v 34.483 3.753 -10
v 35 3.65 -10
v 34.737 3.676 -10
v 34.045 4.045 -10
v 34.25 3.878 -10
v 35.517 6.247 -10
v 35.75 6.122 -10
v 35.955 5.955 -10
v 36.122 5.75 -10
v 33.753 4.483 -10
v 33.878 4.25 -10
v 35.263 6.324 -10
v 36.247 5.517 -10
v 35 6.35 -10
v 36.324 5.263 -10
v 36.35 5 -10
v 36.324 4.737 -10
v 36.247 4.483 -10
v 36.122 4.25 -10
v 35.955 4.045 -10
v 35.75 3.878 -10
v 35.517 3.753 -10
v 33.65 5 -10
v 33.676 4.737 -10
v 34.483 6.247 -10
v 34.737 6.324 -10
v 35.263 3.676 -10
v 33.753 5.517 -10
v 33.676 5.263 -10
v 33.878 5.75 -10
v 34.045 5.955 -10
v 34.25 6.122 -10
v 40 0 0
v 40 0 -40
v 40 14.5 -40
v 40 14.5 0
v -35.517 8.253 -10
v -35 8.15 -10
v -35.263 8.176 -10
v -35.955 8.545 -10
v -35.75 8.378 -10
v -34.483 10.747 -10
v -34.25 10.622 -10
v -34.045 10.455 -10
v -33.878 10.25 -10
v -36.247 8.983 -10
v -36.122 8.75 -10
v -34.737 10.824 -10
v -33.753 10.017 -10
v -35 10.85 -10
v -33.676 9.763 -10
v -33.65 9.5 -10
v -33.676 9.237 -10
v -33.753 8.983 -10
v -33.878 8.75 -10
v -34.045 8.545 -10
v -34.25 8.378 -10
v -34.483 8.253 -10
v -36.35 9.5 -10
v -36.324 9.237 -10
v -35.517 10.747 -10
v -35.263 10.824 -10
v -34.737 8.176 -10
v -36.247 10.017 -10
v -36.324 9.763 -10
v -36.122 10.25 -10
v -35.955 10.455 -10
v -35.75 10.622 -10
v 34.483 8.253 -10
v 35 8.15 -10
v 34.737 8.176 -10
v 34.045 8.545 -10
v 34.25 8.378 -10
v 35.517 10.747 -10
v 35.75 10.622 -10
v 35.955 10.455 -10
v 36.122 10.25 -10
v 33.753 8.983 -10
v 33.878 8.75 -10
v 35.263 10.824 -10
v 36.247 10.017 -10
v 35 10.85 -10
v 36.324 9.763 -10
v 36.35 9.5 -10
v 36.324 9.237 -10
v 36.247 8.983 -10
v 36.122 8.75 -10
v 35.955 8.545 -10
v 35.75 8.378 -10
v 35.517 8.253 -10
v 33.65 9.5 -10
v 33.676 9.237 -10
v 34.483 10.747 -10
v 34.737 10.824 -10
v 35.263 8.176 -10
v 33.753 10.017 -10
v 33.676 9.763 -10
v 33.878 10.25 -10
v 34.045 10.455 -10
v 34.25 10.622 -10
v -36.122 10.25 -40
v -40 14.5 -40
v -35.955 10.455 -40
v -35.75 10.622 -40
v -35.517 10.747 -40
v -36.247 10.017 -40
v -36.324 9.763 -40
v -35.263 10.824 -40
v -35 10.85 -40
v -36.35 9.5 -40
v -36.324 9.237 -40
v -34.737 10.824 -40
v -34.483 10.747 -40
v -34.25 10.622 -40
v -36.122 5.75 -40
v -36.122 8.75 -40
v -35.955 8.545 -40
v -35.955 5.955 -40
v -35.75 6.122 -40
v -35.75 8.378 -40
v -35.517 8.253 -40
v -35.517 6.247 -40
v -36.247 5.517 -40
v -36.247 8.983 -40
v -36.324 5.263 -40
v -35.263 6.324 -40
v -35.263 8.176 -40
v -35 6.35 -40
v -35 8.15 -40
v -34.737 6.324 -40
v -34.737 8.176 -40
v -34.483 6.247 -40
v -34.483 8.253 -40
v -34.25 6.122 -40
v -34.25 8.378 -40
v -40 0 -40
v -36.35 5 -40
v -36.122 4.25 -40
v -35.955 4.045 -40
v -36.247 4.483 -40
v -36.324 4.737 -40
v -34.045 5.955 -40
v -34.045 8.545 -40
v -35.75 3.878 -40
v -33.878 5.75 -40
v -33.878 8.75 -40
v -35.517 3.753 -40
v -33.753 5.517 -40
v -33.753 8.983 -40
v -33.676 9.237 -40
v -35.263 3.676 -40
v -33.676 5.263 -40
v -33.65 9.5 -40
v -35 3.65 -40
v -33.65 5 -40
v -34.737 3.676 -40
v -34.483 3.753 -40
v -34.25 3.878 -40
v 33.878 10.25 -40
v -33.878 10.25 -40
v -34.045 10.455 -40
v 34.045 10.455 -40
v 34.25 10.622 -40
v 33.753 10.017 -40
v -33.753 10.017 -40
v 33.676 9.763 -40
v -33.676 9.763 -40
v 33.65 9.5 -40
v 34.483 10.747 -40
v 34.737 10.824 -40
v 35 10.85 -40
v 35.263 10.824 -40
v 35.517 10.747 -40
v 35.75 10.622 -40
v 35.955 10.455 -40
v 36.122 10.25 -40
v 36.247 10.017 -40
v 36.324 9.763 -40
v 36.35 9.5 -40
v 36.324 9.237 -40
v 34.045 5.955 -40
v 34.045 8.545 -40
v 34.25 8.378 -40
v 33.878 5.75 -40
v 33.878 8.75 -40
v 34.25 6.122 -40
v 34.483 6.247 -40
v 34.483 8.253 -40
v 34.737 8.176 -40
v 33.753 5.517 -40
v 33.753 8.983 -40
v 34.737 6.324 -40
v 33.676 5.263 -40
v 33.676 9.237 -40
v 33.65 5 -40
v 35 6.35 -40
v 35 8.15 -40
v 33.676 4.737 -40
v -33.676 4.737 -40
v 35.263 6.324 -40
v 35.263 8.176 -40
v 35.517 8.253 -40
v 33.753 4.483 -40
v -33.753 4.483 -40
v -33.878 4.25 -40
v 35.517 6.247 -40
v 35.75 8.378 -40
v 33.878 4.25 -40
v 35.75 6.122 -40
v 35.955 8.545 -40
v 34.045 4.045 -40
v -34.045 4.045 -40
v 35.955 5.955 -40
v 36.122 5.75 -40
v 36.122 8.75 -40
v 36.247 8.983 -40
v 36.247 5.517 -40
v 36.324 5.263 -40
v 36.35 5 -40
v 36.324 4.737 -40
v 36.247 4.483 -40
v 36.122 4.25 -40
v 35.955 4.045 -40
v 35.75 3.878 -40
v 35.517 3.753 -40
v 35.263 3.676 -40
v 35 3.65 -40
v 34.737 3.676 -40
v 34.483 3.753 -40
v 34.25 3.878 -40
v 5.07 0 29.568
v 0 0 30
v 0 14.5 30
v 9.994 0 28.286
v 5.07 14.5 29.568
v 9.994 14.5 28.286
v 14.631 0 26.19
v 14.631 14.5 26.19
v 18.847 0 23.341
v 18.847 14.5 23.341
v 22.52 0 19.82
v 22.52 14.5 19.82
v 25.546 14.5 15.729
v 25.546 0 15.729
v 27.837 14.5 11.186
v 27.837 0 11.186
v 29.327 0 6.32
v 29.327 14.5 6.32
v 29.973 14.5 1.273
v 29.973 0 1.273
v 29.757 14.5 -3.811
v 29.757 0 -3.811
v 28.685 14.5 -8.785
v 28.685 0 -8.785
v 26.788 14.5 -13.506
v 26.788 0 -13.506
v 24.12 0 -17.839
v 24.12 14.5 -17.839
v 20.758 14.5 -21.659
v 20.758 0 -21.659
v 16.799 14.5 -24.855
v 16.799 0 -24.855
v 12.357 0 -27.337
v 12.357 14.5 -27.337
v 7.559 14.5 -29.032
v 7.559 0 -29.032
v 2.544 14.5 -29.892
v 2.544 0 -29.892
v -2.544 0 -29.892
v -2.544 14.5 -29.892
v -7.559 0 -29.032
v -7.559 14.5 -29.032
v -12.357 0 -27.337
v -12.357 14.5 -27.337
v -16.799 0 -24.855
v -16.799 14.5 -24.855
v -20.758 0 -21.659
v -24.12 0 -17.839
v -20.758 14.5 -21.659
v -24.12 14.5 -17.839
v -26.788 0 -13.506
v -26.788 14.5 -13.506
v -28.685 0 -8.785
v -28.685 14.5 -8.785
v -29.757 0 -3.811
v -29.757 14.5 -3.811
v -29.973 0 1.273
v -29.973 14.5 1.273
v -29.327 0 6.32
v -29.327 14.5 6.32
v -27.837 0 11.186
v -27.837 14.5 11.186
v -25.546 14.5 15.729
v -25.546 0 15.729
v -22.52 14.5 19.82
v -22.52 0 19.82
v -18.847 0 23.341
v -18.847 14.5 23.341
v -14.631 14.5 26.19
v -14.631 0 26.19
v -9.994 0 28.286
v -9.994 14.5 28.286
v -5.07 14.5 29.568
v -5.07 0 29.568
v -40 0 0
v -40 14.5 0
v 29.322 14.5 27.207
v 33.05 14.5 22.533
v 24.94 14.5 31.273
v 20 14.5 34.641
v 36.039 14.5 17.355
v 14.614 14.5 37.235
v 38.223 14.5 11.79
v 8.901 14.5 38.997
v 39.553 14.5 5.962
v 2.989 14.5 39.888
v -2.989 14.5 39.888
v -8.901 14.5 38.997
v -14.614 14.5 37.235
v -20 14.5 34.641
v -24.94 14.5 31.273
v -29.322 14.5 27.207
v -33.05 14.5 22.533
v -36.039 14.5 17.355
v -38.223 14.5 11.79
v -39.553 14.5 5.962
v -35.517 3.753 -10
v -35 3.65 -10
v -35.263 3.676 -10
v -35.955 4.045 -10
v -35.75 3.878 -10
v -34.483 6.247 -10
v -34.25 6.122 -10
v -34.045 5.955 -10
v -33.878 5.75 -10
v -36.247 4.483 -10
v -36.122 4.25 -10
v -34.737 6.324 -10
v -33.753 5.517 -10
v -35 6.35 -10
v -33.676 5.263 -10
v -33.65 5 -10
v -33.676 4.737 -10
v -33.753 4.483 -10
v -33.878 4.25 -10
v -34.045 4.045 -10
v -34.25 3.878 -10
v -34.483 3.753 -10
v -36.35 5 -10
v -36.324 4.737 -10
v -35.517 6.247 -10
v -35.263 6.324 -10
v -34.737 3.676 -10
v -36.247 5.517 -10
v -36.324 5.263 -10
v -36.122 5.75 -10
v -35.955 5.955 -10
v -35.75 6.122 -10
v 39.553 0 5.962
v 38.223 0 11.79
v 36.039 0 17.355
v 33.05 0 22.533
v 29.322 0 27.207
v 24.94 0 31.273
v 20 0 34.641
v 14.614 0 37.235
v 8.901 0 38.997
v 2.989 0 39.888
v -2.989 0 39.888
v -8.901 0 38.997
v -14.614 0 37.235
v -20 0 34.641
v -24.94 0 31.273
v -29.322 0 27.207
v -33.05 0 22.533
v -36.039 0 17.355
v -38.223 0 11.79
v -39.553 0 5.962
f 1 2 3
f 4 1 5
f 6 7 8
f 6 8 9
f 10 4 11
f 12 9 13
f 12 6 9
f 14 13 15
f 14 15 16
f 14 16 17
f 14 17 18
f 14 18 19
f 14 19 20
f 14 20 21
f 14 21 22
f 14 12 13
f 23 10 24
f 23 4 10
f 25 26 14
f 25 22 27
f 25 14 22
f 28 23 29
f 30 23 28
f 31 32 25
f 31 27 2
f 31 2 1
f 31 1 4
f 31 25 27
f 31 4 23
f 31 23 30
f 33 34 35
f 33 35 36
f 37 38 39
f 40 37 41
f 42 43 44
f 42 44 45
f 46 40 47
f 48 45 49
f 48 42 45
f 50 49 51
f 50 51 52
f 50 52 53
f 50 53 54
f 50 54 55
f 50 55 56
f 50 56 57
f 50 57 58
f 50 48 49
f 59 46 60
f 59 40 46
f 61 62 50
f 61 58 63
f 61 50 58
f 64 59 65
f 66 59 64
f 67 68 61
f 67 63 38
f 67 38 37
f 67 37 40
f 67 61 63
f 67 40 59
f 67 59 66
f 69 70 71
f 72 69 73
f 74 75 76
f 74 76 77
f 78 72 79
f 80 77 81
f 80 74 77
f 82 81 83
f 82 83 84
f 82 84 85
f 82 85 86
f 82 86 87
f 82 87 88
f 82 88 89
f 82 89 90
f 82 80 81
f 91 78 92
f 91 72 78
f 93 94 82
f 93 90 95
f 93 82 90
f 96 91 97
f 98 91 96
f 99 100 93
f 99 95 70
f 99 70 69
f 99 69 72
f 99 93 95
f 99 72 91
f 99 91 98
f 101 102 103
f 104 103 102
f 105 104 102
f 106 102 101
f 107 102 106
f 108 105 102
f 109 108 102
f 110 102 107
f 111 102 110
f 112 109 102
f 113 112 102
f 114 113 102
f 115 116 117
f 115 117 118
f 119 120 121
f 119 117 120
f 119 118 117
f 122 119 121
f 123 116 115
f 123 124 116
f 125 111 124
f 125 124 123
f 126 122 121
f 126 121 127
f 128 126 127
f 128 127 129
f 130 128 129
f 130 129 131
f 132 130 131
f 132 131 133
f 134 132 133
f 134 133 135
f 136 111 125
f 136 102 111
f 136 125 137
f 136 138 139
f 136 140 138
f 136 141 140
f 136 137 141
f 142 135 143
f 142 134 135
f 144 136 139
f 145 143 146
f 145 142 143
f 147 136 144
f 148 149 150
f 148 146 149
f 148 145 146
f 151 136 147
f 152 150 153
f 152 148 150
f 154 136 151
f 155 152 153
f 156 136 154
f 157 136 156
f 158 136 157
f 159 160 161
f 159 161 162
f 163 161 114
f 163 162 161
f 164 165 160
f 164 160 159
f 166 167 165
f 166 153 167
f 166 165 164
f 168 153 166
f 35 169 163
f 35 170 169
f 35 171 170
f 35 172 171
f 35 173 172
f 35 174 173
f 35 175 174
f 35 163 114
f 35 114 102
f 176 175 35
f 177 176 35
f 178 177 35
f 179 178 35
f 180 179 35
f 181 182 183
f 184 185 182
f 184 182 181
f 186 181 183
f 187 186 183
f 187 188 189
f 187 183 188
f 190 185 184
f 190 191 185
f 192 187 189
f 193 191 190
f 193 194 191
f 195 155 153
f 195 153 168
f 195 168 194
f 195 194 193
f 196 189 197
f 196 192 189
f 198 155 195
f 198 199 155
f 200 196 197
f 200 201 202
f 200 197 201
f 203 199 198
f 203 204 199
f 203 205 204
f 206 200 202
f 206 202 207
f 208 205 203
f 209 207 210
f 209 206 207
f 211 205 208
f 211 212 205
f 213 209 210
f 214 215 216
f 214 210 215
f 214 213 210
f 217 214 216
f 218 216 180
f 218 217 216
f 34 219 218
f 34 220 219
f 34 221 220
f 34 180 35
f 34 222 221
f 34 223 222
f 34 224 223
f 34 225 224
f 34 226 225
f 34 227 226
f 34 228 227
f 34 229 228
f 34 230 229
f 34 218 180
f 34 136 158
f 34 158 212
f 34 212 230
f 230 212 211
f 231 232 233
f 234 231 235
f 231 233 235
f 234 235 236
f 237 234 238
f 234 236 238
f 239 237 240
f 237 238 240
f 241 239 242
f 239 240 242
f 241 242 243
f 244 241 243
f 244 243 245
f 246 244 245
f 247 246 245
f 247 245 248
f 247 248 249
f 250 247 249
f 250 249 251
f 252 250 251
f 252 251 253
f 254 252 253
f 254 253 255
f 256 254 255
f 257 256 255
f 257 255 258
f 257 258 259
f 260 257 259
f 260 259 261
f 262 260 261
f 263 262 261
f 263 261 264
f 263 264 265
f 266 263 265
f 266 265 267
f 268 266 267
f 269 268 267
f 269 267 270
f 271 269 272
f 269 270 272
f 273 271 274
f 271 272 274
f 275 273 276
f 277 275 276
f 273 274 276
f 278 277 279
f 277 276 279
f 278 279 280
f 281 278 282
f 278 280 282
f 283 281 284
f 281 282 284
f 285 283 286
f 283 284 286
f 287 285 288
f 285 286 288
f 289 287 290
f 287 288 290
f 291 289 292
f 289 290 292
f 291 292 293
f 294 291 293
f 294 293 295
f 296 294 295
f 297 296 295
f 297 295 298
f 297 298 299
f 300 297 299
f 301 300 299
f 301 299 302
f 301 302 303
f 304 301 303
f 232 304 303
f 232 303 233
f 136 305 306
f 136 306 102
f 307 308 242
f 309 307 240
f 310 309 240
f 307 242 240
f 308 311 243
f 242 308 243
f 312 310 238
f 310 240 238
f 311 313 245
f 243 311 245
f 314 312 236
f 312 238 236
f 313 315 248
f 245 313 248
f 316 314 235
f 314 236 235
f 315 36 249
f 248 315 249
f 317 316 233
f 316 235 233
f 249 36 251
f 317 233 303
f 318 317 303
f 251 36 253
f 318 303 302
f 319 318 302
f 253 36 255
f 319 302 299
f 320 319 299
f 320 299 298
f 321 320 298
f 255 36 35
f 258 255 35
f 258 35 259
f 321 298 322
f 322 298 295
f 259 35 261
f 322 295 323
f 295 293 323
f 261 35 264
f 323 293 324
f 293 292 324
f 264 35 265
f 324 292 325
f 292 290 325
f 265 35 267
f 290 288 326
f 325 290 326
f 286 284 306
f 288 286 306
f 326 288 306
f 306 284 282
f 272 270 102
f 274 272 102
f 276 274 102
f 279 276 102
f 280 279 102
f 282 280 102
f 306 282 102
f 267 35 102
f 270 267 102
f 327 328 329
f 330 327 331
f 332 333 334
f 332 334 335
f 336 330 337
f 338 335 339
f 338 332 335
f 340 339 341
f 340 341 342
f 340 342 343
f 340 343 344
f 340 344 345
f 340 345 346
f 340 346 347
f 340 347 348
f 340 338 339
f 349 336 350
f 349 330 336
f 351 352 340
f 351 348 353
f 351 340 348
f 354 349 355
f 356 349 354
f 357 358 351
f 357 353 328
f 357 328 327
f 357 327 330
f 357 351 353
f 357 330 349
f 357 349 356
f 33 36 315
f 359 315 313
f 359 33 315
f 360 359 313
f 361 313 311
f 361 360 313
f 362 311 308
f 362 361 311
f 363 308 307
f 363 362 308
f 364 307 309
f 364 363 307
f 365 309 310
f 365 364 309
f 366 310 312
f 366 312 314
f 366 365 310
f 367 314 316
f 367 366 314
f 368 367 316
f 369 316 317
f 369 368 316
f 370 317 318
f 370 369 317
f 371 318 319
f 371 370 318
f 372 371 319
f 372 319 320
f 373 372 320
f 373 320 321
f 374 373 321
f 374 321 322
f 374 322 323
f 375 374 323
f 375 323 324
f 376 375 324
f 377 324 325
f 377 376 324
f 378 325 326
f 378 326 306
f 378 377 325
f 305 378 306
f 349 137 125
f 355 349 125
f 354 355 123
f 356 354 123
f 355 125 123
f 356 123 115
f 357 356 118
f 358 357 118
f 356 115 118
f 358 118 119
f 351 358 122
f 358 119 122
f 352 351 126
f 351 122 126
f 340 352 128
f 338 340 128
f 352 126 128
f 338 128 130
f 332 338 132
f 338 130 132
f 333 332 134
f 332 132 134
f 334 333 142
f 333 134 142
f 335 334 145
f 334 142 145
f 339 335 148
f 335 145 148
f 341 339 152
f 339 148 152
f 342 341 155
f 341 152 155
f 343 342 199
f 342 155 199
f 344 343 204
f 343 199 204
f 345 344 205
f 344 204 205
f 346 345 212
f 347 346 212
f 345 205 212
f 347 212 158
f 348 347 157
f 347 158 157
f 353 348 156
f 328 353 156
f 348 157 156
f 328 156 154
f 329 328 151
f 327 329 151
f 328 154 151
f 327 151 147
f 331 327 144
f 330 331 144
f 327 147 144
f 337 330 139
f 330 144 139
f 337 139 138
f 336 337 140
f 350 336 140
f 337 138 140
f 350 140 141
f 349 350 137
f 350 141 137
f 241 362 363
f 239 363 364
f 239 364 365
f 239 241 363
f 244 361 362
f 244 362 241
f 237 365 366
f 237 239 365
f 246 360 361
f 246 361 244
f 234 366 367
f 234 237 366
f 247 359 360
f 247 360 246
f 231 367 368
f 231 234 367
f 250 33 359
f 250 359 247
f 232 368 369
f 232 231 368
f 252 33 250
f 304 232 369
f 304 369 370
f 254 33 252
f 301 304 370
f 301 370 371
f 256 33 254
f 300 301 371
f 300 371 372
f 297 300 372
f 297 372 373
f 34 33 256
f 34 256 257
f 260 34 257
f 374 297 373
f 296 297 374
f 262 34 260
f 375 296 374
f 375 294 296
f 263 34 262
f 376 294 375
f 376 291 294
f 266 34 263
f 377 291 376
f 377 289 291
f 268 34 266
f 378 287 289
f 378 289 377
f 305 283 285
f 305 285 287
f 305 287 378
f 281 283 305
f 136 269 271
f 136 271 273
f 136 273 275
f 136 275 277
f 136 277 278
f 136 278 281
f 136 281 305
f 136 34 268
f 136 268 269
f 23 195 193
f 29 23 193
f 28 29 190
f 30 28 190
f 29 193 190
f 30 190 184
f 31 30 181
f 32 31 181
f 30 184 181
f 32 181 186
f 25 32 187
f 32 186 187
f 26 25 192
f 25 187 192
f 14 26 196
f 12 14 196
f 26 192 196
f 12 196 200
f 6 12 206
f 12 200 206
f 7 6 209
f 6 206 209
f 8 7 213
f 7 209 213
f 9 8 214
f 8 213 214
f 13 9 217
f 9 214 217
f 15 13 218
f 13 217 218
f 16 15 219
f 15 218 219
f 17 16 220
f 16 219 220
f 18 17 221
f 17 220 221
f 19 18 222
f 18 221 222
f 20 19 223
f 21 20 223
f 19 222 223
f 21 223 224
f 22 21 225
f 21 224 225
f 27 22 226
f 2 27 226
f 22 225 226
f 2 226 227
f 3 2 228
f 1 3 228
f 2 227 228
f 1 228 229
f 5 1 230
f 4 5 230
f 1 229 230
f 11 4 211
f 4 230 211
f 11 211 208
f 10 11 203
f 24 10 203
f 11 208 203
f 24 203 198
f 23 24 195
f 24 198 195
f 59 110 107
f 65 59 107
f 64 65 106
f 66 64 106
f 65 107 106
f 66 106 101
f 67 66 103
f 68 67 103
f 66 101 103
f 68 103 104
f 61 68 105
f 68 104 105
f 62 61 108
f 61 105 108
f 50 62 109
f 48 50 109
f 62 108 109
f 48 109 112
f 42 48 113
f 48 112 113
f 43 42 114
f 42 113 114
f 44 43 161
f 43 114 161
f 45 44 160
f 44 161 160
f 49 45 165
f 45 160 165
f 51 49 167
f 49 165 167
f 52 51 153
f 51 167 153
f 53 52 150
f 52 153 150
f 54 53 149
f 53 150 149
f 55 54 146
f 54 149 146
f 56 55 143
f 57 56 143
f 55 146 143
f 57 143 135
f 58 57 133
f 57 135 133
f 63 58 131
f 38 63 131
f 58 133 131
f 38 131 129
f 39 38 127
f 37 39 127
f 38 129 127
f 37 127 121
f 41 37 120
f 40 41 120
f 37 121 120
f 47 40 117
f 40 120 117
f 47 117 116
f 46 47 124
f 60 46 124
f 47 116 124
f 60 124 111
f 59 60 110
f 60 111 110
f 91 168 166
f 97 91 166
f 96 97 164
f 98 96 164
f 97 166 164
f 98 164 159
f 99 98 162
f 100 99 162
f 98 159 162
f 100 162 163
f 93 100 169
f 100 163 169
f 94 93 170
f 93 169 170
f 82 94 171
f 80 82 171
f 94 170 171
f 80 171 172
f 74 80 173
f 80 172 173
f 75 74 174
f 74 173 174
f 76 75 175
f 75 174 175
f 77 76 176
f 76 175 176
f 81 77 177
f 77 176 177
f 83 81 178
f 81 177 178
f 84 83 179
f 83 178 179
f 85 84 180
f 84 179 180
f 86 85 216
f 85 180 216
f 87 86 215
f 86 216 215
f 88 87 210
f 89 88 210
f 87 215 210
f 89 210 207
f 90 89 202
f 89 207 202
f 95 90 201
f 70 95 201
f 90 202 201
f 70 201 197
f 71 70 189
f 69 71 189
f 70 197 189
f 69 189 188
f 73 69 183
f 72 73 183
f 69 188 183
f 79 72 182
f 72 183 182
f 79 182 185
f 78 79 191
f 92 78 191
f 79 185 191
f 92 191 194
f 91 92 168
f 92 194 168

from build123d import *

# Parameters (mm, degrees)
SALIENTE_EXTRUIR1_DEPTH = 14.5
CROQUIS3_R              = 30
CORTAR_EXTRUIR1_DEPTH   = 59.39734583
CROQUIS4_R              = 1.35
CORTAR_EXTRUIR2_DEPTH   = 30


with BuildPart() as part:
    # Croquis1 → Saliente-Extruir1 (new body)
    with BuildSketch(Plane(origin=(0, 0, 0), x_dir=(1, 0, 0), z_dir=(0, 1, 0))):
        with BuildLine():
            Line((-40, 0), (-40, 40))
            Line((-40, 40), (40, 40))
            Line((40, 40), (40, 0))
            ThreePointArc((40, 0), (0, -40), (-40, 0))
        make_face()
    extrude(amount=SALIENTE_EXTRUIR1_DEPTH)

    # Croquis3 → Cortar-Extruir1 (cut, through all)
    with BuildSketch(Plane(origin=(0, 14.5, 0), x_dir=(1, 0, 0), z_dir=(0, 1, 0))):
        with Locations(Location((0, 0, 0), (0, 0, 270))):
            Circle(CROQUIS3_R)
    extrude(amount=-CORTAR_EXTRUIR1_DEPTH, mode=Mode.SUBTRACT)

    # Croquis4 → Cortar-Extruir2 (cut)
    with BuildSketch(Plane(origin=(0, 0, -40), x_dir=(-1, 0, 0), z_dir=(0, 0, -1))):
        with Locations((-35, 9.5)):
            Circle(CROQUIS4_R)
        with Locations((-35, 5)):
            Circle(CROQUIS4_R)
        with Locations((35, 9.5)):
            Circle(CROQUIS4_R)
        with Locations((35, 5)):
            Circle(CROQUIS4_R)
    extrude(amount=-CORTAR_EXTRUIR2_DEPTH, mode=Mode.SUBTRACT)


solid = part.part
